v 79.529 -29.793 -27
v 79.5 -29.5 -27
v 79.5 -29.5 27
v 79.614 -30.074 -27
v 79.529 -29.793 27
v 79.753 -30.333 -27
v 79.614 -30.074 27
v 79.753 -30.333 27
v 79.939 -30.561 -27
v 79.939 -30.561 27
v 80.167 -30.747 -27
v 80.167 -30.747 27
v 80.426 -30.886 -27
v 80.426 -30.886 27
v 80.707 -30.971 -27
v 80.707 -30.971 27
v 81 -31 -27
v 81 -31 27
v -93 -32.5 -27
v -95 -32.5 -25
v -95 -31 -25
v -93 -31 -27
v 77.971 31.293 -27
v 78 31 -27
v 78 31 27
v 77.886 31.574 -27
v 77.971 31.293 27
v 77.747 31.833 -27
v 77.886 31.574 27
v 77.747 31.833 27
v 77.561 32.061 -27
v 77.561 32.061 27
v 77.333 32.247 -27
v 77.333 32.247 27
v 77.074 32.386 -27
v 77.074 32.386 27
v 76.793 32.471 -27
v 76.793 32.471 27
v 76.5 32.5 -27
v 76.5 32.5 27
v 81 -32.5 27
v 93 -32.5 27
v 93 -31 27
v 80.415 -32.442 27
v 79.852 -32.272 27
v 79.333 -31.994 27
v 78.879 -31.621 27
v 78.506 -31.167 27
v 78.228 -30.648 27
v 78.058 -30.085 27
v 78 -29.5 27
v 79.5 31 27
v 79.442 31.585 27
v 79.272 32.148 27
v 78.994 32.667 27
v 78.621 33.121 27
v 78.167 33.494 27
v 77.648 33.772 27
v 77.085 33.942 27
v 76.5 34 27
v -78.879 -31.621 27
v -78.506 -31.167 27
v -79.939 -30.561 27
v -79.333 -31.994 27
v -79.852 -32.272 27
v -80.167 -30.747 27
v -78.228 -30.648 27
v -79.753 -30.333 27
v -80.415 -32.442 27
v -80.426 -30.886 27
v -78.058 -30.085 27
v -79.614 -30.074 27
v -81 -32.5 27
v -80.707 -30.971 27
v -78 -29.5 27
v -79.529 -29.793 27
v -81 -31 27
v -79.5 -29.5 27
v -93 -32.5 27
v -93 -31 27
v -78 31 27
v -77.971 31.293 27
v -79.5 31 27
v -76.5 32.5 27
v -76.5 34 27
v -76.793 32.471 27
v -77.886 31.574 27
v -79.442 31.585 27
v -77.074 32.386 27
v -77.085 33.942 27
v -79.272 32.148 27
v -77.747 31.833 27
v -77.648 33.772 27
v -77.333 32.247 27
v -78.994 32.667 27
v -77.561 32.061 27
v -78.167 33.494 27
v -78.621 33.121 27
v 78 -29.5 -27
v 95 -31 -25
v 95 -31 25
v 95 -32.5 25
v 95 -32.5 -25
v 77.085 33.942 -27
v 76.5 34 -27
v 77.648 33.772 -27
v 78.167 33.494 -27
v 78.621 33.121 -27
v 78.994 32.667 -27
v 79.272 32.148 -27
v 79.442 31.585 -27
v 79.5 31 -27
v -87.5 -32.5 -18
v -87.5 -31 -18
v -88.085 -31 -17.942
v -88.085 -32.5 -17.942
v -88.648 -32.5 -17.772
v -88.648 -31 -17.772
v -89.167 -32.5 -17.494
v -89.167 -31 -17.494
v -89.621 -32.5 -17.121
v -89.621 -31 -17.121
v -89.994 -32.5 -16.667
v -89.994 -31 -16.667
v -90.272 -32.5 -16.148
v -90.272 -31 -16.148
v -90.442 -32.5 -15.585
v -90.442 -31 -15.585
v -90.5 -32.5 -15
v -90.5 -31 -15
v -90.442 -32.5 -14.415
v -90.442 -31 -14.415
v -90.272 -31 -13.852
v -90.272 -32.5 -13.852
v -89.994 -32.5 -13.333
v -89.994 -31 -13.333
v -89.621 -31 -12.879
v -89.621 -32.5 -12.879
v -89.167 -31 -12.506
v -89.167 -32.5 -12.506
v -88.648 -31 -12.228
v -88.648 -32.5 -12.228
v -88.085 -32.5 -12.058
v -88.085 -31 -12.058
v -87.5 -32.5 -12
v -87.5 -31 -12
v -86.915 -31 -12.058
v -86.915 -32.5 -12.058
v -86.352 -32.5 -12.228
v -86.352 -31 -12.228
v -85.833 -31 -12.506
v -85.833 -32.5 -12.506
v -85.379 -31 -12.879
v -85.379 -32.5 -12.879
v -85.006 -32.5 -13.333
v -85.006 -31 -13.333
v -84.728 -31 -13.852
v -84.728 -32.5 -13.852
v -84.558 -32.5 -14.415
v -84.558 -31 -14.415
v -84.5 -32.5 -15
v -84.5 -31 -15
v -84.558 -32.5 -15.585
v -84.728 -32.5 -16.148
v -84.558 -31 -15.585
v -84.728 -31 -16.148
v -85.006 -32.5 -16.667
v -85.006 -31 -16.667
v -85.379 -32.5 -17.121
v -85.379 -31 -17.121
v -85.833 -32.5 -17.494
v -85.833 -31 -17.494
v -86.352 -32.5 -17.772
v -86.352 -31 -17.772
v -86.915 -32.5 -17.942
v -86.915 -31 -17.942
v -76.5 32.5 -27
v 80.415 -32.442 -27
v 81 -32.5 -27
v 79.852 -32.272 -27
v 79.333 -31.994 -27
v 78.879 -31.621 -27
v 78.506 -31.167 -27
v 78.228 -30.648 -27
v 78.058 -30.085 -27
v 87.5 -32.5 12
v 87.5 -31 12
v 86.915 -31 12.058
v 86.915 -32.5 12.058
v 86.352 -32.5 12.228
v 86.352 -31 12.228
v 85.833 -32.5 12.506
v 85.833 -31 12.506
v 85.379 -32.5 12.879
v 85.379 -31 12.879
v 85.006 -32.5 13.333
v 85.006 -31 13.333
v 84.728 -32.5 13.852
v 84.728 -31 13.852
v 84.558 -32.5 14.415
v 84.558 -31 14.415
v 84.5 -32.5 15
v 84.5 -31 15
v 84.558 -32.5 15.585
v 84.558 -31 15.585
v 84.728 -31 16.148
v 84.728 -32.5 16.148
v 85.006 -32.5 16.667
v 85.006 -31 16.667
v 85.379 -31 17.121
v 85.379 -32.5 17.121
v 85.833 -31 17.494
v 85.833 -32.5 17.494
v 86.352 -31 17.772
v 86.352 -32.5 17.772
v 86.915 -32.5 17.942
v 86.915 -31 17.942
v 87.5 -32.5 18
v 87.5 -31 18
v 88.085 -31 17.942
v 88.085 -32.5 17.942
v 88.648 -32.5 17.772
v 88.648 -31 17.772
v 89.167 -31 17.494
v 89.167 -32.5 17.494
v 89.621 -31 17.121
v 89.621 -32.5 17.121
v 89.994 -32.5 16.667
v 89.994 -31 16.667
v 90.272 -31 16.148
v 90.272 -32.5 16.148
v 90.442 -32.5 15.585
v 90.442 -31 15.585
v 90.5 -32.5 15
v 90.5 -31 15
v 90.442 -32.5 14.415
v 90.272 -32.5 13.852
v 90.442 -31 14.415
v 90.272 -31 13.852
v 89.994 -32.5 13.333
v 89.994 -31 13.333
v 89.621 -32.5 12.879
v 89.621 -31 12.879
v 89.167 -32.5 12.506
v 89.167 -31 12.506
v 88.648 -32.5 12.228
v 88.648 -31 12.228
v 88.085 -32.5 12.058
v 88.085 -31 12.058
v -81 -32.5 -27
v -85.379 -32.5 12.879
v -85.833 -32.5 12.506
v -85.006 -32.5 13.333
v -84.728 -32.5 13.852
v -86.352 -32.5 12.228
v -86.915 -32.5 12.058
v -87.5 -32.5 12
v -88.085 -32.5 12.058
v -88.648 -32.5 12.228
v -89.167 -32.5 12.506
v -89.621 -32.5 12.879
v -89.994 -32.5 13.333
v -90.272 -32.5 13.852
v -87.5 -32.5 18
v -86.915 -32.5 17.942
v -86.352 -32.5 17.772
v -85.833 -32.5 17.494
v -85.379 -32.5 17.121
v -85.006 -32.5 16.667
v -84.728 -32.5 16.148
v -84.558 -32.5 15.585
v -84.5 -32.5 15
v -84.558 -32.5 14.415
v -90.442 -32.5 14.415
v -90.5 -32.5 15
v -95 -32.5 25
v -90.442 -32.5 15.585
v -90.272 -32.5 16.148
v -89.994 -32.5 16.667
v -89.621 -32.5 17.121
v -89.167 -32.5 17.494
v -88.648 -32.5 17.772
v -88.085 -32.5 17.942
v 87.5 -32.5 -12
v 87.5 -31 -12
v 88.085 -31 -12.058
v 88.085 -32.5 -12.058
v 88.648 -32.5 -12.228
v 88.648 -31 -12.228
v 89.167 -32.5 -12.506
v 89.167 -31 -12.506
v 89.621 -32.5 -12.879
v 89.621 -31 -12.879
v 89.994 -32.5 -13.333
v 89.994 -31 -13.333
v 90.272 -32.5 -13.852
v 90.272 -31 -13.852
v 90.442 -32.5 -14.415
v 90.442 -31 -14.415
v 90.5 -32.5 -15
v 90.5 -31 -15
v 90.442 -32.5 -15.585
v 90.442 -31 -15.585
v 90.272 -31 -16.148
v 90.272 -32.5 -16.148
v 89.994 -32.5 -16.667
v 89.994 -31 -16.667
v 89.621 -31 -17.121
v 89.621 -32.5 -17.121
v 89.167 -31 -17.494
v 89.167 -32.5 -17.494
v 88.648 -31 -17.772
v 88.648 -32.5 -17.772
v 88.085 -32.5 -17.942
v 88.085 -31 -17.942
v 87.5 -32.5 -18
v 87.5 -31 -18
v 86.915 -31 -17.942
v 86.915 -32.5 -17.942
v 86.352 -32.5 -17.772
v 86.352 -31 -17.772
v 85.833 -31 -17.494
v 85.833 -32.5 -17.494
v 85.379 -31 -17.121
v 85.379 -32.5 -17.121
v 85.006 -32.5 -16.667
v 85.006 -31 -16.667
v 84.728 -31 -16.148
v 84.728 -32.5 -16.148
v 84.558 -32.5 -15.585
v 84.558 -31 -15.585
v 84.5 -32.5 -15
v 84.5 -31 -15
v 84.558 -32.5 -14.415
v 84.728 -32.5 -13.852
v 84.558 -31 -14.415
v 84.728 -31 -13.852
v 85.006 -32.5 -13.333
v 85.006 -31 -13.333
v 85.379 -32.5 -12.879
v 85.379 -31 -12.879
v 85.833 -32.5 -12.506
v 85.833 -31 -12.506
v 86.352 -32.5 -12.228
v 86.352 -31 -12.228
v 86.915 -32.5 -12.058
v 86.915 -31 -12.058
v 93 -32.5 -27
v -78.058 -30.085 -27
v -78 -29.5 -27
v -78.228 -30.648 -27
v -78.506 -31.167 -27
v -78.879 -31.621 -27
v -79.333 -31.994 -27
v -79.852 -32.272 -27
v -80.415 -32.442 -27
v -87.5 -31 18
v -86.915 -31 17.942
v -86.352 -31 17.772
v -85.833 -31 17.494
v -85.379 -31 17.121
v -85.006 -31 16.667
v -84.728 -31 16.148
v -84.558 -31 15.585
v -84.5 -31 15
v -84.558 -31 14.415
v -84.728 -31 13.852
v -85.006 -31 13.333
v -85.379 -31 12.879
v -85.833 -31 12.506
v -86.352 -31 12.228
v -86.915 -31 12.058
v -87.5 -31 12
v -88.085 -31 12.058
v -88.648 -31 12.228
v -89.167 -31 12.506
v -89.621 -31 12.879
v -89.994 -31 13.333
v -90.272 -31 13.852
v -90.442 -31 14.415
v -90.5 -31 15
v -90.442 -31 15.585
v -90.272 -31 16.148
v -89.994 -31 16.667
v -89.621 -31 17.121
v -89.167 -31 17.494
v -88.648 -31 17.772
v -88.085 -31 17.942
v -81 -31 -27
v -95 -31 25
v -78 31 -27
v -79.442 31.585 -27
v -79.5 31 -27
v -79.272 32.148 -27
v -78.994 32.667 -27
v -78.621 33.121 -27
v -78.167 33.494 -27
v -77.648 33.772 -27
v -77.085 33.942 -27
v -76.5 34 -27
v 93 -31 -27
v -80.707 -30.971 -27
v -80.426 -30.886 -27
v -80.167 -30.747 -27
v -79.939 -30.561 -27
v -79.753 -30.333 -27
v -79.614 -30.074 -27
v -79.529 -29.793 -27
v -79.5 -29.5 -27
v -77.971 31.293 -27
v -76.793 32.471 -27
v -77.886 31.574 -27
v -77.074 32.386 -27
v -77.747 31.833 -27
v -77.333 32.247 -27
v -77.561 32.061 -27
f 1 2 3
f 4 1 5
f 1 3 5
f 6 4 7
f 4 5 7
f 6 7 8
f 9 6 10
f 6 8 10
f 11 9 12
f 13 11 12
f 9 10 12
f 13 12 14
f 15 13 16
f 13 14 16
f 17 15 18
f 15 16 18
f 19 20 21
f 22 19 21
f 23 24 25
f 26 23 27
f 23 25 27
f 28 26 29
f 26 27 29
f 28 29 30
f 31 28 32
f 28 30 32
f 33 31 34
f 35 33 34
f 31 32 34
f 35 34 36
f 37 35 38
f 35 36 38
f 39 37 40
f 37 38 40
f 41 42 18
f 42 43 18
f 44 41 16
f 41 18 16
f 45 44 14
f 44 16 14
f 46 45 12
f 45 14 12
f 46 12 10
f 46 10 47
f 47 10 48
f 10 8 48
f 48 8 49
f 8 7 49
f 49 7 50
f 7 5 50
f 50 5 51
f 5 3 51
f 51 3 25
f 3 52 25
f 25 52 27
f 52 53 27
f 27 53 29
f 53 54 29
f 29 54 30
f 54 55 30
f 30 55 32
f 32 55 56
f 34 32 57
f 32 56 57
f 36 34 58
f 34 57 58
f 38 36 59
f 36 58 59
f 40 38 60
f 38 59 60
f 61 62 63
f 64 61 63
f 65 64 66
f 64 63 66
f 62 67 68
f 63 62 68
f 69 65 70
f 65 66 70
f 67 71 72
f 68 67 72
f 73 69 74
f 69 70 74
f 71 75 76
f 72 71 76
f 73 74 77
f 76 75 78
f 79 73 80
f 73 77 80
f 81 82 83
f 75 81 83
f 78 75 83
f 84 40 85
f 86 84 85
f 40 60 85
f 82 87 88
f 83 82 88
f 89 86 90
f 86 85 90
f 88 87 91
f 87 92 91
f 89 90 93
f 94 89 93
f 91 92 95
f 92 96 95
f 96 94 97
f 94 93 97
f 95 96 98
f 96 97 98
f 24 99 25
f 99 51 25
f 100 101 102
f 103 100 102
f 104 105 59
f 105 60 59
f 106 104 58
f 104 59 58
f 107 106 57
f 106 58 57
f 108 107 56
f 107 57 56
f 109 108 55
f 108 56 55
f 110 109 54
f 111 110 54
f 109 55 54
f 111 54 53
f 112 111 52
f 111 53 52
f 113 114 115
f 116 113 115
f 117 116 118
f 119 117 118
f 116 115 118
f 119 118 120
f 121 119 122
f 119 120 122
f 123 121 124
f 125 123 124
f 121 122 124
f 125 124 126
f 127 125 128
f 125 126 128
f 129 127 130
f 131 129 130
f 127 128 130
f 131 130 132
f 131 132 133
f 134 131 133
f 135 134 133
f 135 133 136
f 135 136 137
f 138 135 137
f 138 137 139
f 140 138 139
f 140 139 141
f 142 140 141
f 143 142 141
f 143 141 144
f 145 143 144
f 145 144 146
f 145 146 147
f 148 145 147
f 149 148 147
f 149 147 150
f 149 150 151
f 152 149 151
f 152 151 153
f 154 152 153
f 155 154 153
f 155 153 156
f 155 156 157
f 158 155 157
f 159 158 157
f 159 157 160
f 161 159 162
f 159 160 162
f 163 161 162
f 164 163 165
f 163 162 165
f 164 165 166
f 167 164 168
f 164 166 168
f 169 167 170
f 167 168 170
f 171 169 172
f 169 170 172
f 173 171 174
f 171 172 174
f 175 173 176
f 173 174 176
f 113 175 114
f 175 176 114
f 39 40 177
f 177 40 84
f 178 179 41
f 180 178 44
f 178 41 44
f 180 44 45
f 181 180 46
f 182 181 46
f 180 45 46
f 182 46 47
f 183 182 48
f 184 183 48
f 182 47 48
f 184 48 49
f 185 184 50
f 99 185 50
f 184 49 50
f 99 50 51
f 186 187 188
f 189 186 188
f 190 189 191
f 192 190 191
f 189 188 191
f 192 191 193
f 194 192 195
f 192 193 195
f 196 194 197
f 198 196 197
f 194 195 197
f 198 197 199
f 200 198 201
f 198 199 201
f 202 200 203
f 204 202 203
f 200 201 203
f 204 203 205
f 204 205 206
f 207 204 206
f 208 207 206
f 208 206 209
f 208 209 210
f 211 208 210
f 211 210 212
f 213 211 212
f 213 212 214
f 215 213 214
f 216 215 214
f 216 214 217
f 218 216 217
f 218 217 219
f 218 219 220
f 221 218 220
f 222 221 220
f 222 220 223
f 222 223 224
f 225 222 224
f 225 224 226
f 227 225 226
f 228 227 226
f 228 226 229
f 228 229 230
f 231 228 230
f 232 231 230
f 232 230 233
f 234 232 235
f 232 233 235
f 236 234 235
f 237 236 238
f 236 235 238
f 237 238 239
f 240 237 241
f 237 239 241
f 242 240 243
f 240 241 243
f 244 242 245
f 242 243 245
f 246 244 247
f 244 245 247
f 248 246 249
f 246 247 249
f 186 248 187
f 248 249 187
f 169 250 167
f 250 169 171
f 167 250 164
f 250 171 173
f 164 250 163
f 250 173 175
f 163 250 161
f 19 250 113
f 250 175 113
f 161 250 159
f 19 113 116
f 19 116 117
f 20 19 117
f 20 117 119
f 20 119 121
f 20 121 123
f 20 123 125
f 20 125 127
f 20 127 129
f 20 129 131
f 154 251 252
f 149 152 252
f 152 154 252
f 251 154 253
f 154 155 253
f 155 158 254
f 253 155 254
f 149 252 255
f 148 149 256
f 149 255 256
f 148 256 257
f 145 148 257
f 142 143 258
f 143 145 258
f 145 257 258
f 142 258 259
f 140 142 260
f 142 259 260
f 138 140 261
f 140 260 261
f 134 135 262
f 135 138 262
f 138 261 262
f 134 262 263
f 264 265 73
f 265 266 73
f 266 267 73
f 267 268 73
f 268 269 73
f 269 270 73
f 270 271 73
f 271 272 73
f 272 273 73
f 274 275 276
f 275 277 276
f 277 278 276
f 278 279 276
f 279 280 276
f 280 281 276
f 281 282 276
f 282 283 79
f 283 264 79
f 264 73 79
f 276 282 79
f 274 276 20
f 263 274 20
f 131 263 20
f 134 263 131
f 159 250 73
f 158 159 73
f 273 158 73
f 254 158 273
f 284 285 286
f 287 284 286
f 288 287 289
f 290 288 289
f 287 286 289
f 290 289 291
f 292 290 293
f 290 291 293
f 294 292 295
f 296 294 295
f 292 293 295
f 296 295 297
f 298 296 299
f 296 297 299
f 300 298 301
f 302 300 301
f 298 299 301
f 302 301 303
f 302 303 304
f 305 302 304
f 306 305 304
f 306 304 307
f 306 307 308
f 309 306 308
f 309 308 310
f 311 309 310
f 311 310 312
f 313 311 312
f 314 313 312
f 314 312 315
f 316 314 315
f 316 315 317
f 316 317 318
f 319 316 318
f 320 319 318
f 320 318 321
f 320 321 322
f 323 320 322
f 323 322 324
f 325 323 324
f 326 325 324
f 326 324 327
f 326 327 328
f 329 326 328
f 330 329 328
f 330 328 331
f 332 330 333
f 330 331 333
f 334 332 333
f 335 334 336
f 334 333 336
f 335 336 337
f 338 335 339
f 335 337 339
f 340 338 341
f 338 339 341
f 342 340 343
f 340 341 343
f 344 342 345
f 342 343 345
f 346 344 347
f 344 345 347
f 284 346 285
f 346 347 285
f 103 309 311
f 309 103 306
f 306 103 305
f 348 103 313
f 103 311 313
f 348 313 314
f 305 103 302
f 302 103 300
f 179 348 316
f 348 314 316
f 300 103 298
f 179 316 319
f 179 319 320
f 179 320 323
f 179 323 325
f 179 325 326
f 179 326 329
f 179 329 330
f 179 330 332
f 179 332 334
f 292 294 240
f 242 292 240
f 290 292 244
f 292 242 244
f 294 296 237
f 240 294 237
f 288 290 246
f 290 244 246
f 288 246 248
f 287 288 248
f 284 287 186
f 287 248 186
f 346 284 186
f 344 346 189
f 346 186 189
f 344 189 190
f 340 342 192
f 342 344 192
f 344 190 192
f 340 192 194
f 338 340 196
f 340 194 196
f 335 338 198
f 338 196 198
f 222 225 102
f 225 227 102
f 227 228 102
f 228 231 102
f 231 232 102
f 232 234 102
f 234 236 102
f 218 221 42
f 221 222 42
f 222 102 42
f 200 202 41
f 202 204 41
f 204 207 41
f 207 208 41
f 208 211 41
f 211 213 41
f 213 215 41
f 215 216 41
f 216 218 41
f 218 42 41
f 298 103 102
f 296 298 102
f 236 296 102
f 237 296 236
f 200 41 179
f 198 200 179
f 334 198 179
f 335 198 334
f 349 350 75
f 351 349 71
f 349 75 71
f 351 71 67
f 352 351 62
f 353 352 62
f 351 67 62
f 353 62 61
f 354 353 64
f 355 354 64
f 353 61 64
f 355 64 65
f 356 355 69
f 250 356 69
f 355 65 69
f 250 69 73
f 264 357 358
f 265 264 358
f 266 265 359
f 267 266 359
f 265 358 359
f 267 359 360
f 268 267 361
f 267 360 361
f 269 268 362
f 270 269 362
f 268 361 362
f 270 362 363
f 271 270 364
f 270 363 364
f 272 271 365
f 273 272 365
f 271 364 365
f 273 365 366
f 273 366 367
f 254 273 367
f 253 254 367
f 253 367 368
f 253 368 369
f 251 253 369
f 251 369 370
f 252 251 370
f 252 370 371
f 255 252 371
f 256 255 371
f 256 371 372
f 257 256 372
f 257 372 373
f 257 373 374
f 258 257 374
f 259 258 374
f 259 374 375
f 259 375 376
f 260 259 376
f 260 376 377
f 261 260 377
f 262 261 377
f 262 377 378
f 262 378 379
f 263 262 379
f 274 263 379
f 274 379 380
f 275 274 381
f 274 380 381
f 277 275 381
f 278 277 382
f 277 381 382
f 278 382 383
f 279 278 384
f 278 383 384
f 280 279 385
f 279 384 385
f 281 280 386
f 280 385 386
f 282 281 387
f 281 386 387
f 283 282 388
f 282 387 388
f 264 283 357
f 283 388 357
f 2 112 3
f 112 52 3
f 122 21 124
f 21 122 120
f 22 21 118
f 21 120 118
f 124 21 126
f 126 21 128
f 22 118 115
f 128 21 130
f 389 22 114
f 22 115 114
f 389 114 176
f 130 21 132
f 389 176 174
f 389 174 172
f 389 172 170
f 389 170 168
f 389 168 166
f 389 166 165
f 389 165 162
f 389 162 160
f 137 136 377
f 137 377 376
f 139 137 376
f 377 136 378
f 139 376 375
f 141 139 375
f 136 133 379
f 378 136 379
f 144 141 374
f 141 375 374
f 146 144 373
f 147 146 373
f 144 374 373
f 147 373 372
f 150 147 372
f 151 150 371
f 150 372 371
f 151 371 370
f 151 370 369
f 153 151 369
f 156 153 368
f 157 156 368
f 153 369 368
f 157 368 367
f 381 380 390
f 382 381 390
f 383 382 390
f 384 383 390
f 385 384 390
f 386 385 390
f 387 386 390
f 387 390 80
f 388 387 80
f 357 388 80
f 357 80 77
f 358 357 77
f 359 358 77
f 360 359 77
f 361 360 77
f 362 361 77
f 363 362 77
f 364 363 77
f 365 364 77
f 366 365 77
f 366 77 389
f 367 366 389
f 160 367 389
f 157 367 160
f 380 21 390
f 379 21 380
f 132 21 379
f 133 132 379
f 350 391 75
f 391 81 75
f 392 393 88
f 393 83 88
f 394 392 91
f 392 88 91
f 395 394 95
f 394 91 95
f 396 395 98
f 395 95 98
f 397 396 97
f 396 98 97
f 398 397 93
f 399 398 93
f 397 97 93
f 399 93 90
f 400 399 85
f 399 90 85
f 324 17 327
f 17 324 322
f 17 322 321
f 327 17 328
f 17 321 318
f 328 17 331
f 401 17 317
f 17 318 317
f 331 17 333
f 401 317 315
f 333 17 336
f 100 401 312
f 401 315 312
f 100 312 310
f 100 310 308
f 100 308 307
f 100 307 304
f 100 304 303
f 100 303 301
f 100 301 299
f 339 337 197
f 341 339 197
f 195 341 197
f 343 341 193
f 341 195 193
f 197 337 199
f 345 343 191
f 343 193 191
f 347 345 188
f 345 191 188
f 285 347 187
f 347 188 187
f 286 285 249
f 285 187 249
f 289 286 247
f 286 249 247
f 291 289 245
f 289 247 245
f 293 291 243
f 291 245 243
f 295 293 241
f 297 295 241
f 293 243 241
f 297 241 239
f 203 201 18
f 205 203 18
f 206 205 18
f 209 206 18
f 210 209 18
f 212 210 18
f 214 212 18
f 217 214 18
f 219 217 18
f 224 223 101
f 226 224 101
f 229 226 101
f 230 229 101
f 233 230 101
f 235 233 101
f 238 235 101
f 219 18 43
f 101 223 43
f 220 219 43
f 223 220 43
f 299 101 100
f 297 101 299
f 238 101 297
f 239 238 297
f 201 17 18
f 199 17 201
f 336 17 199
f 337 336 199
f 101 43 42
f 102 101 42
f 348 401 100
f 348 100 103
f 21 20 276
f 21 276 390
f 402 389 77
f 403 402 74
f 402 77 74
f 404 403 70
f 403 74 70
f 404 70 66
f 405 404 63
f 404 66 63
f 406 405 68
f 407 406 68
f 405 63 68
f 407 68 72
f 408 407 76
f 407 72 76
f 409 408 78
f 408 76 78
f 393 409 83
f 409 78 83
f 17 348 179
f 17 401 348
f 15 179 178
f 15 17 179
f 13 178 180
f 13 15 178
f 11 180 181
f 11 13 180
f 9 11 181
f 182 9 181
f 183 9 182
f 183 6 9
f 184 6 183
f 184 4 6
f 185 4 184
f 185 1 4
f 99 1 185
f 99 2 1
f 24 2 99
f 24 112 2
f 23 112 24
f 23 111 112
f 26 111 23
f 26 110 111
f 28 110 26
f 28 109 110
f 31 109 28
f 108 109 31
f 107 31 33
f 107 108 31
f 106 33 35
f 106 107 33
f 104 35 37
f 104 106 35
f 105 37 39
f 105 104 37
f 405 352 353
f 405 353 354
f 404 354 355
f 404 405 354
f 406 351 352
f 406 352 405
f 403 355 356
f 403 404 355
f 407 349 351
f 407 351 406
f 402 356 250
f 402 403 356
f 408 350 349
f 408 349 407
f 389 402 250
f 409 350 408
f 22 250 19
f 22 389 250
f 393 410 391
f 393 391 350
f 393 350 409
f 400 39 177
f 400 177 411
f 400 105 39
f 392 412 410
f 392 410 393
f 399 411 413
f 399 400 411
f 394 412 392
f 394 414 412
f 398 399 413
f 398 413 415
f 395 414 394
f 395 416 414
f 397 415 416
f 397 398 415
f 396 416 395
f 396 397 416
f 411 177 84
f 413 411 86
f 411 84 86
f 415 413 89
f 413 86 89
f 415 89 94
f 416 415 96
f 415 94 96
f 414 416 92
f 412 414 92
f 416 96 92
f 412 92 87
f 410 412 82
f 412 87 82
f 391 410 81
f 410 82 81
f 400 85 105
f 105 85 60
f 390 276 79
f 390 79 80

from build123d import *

# Parameters (mm, degrees)
BASE_FLANGE1_DEPTH = 27
SKETCH2_R          = 3
CUT_EXTRUDE1_DEPTH = 10
CHAMFER1_SIZE      = 2


# Sheet-metal steps are written as plain solids
with BuildPart() as part:
    # Sketch1 → Base-Flange1 (new, symmetric)
    with BuildSketch(Plane.XY):
        with BuildLine():
            Line((95, -32.5), (81, -32.5))
            ThreePointArc((81, -32.5), (78.878679656, -31.621320344), (78, -29.5))
            Line((78, -29.5), (78, 31))
            ThreePointArc((78, 31), (77.560660172, 32.060660172), (76.5, 32.5))
            Line((76.5, 32.5), (-76.5, 32.5))
            ThreePointArc((-76.5, 32.5), (-77.560660172, 32.060660172), (-78, 31))
            Line((-78, 31), (-78, -29.5))
            ThreePointArc((-78, -29.5), (-78.878679656, -31.621320344), (-81, -32.5))
            Line((-81, -32.5), (-95, -32.5))
            Line((-95, -32.5), (-95, -31))
            Line((-95, -31), (-81, -31))
            ThreePointArc((-81, -31), (-79.939339828, -30.560660172), (-79.5, -29.5))
            Line((-79.5, -29.5), (-79.5, 31))
            ThreePointArc((-79.5, 31), (-78.621320344, 33.121320344), (-76.5, 34))
            Line((-76.5, 34), (76.5, 34))
            ThreePointArc((76.5, 34), (78.621320344, 33.121320344), (79.5, 31))
            Line((79.5, 31), (79.5, -29.5))
            ThreePointArc((79.5, -29.5), (79.939339828, -30.560660172), (81, -31))
            Line((81, -31), (95, -31))
            Line((95, -31), (95, -32.5))
        make_face()
    extrude(amount=BASE_FLANGE1_DEPTH, both=True)

    # Sketch2 → Cut-Extrude1 (cut)
    with BuildSketch(Plane(origin=(0, -31, 0), x_dir=(1, 0, 0), z_dir=(0, 1, 0))):
        with Locations(Location((-87.5, -15, 0), (0, 0, 270))):
            Circle(SKETCH2_R)
        with Locations(Location((87.5, -15, 0), (0, 0, 90))):
            Circle(SKETCH2_R)
        with Locations(Location((87.5, 15, 0), (0, 0, 270))):
            Circle(SKETCH2_R)
        with Locations(Location((-87.5, 15, 0), (0, 0, 90))):
            Circle(SKETCH2_R)
    extrude(amount=-CUT_EXTRUDE1_DEPTH, mode=Mode.SUBTRACT)

    # Chamfer1
    chamfer1_edges = [part.edges().sort_by_distance(p)[0] for p in [
        (95, -31.75, -27),
        (-95, -31.75, -27),
        (95, -31.75, 27),
        (-95, -31.75, 27),
    ]]
    chamfer(chamfer1_edges, length=CHAMFER1_SIZE)


solid = part.part
